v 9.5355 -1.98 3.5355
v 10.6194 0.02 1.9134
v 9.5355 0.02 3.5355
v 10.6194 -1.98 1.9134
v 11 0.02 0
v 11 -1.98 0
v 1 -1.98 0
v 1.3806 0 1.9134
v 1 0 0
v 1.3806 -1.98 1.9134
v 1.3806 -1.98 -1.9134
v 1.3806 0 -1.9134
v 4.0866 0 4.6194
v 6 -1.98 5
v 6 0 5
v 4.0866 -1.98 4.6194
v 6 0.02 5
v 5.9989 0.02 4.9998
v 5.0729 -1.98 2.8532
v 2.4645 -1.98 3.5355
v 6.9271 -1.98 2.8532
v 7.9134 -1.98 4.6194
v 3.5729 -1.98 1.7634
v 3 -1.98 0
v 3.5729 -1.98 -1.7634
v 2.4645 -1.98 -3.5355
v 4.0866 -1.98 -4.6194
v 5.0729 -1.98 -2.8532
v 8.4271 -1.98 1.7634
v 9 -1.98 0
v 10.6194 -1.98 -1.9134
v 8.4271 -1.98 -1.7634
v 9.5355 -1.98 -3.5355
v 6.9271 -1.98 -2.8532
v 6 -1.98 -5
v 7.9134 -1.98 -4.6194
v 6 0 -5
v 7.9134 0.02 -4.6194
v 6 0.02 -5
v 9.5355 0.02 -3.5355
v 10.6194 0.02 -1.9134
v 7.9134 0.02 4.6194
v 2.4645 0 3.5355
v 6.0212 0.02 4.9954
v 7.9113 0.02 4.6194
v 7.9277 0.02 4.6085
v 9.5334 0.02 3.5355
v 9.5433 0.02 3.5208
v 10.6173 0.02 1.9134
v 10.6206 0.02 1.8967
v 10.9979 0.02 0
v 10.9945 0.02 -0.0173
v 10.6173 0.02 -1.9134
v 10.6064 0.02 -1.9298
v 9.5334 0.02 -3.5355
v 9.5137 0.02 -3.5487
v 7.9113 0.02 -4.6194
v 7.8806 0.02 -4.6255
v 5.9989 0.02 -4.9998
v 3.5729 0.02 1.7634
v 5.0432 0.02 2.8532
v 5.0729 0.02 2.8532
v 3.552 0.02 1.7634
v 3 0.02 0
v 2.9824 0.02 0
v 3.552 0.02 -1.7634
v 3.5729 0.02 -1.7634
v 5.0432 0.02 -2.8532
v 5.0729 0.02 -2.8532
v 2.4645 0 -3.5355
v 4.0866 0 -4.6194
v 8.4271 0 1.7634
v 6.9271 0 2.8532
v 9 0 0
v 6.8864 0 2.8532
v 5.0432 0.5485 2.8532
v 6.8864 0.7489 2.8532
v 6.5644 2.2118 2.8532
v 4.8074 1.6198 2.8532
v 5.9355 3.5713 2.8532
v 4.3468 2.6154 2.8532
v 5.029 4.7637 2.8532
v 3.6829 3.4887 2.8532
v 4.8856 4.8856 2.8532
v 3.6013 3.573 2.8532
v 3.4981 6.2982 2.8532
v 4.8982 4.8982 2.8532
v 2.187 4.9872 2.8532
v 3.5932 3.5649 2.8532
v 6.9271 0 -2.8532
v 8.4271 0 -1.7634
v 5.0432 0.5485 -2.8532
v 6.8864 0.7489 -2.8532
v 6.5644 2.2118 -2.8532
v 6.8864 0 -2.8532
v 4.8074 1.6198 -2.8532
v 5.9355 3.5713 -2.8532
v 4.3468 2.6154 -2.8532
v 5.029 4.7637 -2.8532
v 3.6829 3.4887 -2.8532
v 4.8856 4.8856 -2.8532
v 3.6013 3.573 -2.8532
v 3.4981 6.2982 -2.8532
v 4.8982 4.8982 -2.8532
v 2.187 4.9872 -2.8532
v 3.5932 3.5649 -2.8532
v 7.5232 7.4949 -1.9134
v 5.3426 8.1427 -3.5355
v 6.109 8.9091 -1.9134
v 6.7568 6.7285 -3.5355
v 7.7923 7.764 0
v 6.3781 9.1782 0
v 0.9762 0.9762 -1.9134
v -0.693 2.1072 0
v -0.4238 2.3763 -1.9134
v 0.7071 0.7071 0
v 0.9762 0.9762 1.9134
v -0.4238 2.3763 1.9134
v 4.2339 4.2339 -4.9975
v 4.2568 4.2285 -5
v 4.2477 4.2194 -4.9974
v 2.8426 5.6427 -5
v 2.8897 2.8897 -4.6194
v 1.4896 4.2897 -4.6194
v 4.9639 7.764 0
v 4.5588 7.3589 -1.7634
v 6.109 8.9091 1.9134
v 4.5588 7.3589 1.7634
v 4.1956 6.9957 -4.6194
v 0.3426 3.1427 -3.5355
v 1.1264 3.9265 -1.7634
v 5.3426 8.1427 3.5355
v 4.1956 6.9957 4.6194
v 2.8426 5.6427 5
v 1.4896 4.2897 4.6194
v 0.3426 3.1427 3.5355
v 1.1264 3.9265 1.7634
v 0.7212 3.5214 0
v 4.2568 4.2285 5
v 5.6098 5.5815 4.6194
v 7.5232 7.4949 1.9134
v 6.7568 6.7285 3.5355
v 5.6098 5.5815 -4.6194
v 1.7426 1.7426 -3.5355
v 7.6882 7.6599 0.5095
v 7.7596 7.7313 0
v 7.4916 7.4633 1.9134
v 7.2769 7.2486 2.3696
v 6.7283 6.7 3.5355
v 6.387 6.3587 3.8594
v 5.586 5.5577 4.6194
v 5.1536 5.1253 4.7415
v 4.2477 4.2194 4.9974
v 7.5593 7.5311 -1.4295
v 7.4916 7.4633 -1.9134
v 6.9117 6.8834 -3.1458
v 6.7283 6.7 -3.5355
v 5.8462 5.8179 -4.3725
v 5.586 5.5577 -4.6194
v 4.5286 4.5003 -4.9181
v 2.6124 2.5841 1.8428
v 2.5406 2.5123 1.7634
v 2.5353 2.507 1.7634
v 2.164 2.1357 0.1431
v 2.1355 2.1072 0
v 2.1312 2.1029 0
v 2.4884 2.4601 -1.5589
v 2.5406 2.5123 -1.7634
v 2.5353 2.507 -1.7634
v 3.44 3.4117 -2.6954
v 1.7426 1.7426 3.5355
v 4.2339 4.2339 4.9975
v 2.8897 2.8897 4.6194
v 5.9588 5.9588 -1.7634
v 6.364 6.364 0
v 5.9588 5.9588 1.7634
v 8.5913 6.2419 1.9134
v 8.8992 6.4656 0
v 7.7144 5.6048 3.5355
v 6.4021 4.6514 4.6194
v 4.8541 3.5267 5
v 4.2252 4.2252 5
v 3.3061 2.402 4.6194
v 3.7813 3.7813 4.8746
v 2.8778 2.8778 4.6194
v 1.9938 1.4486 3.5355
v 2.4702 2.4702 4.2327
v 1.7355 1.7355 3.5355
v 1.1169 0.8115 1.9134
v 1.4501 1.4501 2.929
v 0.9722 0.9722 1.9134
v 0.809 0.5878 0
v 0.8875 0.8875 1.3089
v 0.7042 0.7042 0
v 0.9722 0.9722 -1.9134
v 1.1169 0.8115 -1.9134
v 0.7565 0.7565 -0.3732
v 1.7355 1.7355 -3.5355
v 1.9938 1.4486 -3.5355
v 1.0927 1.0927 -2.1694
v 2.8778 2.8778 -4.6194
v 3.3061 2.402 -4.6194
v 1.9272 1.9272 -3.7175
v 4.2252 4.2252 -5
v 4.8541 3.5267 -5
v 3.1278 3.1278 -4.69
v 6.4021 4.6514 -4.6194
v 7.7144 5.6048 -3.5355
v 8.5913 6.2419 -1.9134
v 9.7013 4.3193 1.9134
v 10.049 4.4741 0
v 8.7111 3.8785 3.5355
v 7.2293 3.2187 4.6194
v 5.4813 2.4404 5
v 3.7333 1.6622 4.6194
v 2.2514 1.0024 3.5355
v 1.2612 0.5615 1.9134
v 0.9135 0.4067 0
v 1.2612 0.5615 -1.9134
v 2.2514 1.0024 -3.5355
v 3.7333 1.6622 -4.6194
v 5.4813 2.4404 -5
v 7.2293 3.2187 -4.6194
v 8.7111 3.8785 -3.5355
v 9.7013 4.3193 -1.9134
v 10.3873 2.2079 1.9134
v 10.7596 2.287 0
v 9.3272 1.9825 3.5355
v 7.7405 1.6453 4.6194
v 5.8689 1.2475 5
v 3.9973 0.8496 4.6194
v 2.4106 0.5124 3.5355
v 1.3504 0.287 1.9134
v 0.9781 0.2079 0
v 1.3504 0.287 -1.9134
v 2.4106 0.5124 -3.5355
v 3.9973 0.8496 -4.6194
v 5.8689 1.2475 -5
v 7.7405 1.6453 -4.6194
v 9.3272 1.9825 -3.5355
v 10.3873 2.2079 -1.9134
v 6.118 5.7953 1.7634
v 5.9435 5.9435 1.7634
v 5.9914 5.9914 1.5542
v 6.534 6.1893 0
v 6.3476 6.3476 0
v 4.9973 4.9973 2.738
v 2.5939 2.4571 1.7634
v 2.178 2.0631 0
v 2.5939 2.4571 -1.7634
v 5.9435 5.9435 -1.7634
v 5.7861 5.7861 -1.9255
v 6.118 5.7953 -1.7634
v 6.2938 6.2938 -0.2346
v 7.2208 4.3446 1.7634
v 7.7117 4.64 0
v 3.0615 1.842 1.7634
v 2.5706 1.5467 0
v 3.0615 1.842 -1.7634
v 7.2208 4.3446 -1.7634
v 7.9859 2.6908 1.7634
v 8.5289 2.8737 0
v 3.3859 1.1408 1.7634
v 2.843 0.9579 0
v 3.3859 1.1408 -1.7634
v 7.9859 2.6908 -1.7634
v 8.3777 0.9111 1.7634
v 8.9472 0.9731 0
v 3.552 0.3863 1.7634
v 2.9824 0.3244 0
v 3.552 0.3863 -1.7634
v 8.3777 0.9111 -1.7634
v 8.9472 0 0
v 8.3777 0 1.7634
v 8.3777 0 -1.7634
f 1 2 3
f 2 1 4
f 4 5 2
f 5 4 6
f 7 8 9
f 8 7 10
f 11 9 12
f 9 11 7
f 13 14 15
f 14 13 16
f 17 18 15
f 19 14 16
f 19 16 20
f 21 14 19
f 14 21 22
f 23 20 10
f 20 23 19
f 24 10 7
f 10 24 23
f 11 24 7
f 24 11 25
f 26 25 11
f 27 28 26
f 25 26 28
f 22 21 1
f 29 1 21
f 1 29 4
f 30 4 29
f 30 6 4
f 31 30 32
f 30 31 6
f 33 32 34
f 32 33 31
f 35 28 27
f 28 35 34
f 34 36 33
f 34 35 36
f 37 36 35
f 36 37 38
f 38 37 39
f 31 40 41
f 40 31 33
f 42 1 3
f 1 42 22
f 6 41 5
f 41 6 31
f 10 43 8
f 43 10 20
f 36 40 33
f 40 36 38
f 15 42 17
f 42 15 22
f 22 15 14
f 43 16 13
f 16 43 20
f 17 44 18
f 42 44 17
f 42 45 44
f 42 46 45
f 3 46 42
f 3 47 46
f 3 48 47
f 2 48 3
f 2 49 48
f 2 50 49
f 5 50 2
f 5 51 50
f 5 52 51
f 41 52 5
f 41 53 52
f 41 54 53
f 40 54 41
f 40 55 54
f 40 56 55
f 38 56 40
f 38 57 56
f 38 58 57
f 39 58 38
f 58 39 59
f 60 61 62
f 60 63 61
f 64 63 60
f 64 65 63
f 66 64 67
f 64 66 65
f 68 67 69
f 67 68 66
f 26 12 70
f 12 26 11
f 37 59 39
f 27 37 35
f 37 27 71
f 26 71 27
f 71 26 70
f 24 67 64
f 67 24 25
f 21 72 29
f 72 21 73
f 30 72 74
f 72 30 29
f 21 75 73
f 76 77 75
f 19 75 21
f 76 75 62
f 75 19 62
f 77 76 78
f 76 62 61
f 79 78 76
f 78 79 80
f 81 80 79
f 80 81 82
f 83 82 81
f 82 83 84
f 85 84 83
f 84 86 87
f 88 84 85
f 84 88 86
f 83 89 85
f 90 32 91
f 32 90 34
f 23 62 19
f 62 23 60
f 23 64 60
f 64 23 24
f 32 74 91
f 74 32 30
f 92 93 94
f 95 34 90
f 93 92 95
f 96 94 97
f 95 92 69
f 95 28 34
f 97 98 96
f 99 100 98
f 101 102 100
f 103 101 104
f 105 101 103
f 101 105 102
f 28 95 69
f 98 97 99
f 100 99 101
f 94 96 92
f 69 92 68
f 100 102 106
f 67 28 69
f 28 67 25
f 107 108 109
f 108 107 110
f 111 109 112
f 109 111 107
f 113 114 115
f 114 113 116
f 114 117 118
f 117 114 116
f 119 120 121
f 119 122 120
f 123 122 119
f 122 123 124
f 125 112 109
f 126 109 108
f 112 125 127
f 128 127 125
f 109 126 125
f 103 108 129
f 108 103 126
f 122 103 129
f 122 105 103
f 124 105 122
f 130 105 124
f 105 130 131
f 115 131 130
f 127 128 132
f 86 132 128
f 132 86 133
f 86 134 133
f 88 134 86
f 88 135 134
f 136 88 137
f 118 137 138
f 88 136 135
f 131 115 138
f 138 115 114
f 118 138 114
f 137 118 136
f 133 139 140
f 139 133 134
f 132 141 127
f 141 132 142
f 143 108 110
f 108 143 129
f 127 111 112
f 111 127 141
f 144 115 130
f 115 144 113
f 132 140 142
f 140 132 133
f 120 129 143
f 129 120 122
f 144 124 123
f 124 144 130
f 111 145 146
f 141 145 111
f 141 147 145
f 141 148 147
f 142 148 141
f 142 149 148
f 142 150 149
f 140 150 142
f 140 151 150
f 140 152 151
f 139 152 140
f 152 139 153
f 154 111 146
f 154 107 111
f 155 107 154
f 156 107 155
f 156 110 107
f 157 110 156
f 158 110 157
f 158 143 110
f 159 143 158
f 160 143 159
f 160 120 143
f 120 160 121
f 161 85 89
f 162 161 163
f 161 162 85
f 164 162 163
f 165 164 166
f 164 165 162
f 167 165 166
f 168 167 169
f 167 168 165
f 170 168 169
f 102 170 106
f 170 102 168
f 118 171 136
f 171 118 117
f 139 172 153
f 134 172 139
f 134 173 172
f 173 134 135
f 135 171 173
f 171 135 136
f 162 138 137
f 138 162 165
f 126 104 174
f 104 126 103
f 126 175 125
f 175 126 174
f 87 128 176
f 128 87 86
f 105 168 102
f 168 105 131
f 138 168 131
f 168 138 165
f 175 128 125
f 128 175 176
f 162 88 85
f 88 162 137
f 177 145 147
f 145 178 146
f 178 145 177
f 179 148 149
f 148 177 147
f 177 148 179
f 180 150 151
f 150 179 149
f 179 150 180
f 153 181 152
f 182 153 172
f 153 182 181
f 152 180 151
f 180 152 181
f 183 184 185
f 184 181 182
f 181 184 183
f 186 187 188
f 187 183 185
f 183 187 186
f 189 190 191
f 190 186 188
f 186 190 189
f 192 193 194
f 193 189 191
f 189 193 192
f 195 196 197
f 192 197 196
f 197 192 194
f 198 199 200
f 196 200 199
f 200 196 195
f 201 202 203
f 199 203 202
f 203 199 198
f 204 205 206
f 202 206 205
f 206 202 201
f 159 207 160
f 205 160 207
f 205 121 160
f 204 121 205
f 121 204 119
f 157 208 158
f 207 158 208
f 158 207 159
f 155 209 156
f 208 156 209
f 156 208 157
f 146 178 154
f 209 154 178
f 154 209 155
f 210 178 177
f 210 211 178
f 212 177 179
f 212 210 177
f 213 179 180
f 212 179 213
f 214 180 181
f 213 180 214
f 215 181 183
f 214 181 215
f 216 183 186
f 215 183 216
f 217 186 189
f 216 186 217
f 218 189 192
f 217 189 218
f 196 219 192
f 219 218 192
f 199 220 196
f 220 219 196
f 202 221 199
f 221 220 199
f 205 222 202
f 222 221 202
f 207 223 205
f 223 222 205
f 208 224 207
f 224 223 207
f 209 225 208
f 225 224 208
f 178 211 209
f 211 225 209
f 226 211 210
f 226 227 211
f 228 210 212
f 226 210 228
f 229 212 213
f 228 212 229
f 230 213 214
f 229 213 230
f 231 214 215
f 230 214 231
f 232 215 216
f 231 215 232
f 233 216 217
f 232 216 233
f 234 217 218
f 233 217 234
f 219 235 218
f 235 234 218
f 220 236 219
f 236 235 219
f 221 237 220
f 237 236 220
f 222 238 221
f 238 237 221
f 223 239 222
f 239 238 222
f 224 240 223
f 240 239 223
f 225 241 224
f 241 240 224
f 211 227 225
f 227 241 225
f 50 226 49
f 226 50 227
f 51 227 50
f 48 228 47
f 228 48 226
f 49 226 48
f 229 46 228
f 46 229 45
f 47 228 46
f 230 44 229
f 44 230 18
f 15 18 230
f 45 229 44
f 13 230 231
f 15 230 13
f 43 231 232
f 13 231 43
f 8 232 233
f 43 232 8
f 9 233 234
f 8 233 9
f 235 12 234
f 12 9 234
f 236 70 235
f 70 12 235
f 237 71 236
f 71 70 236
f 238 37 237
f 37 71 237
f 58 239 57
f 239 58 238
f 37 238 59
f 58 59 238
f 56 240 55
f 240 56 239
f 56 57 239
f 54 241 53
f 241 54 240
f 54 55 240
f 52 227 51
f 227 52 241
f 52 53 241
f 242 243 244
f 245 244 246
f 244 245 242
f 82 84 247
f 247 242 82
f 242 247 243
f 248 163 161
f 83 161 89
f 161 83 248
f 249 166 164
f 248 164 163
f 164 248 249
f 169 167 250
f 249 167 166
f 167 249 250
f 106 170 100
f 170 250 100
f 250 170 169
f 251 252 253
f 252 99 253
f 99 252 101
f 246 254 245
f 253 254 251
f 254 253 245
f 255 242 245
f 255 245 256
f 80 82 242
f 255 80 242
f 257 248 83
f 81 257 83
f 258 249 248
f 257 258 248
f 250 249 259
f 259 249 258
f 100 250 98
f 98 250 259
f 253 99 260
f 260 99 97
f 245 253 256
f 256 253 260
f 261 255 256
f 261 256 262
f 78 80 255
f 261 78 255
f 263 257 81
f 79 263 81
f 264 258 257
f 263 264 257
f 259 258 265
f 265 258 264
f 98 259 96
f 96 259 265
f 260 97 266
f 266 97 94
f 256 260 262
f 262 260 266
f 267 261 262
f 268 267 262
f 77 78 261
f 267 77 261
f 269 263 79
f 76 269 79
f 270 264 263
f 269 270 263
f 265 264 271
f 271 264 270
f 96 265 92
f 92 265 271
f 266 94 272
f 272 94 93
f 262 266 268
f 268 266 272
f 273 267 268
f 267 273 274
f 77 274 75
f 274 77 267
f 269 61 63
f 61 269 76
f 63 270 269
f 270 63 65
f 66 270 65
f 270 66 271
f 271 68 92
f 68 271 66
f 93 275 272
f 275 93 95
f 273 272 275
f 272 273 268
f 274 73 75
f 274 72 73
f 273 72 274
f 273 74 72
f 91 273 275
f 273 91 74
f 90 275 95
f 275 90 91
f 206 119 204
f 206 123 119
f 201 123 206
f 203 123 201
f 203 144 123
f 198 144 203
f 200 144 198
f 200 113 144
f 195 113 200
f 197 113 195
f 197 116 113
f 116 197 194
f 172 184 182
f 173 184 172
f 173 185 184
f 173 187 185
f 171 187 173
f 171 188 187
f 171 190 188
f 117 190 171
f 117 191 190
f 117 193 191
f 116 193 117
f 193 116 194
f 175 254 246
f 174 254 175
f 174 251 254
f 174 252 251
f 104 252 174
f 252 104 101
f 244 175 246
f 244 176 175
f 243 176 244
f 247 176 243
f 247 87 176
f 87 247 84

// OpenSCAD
module bent_pipe(radius, inner_radius, bend_radius,
		angle_1, angle_2, lower_arm_length, upper_arm_length) {
	union() {
        // lower arm
        if (lower_arm_length>0) {
        	rotate([0, 0, angle_1])
                translate([bend_radius + radius, 0.02, 0])
                	rotate([90, 0, 0])
                		difference() {
                        	cylinder(r=radius, h=lower_arm_length);
                        	translate([0, 0, -1])
                                cylinder(r=inner_radius, h=lower_arm_length+2);
                		}
        }

	// upper arm
    if (upper_arm_length>0) {
        rotate([0, 0, angle_2])
            translate([bend_radius + radius, -0.02, 0])
                rotate([-90, 0, 0])
                	difference() {
                        cylinder(r=radius, h=upper_arm_length);
                        translate([0, 0, -1])
                            cylinder(r=inner_radius, h=upper_arm_length+2);
                	}
    }

	// bend
    difference() {
        // torus
        rotate_extrude()
       		translate([bend_radius + radius, 0, 0])
                circle(r=radius);

        // torus cutout
        rotate_extrude()
        	translate([bend_radius + radius, 0, 0])
                circle(r=inner_radius);

		// lower cutout
        rotate([0, 0, angle_1])
        	translate([
					-(bend_radius+2*radius+1) * (((angle_2 - angle_1) <= 180)?1:0),
					-bend_radius-2*radius-2,
					-(radius+1)])
                cube([
					2*(bend_radius+2*radius+1),
					bend_radius+2*radius+2,
					2*(radius+1)]);
        // upper cutout
        rotate([0, 0, angle_2])
        	translate([
					-(bend_radius+2*radius+1) * (((angle_2 - angle_1) <= 180)?1:0),
					0,
					-radius])
                cube([
					2*(bend_radius+2*radius+1),
					bend_radius+2*radius+1,
					2*(radius+1)]);
        }
	}
}

bent_pipe(5,3,1,0,45,2,2);
